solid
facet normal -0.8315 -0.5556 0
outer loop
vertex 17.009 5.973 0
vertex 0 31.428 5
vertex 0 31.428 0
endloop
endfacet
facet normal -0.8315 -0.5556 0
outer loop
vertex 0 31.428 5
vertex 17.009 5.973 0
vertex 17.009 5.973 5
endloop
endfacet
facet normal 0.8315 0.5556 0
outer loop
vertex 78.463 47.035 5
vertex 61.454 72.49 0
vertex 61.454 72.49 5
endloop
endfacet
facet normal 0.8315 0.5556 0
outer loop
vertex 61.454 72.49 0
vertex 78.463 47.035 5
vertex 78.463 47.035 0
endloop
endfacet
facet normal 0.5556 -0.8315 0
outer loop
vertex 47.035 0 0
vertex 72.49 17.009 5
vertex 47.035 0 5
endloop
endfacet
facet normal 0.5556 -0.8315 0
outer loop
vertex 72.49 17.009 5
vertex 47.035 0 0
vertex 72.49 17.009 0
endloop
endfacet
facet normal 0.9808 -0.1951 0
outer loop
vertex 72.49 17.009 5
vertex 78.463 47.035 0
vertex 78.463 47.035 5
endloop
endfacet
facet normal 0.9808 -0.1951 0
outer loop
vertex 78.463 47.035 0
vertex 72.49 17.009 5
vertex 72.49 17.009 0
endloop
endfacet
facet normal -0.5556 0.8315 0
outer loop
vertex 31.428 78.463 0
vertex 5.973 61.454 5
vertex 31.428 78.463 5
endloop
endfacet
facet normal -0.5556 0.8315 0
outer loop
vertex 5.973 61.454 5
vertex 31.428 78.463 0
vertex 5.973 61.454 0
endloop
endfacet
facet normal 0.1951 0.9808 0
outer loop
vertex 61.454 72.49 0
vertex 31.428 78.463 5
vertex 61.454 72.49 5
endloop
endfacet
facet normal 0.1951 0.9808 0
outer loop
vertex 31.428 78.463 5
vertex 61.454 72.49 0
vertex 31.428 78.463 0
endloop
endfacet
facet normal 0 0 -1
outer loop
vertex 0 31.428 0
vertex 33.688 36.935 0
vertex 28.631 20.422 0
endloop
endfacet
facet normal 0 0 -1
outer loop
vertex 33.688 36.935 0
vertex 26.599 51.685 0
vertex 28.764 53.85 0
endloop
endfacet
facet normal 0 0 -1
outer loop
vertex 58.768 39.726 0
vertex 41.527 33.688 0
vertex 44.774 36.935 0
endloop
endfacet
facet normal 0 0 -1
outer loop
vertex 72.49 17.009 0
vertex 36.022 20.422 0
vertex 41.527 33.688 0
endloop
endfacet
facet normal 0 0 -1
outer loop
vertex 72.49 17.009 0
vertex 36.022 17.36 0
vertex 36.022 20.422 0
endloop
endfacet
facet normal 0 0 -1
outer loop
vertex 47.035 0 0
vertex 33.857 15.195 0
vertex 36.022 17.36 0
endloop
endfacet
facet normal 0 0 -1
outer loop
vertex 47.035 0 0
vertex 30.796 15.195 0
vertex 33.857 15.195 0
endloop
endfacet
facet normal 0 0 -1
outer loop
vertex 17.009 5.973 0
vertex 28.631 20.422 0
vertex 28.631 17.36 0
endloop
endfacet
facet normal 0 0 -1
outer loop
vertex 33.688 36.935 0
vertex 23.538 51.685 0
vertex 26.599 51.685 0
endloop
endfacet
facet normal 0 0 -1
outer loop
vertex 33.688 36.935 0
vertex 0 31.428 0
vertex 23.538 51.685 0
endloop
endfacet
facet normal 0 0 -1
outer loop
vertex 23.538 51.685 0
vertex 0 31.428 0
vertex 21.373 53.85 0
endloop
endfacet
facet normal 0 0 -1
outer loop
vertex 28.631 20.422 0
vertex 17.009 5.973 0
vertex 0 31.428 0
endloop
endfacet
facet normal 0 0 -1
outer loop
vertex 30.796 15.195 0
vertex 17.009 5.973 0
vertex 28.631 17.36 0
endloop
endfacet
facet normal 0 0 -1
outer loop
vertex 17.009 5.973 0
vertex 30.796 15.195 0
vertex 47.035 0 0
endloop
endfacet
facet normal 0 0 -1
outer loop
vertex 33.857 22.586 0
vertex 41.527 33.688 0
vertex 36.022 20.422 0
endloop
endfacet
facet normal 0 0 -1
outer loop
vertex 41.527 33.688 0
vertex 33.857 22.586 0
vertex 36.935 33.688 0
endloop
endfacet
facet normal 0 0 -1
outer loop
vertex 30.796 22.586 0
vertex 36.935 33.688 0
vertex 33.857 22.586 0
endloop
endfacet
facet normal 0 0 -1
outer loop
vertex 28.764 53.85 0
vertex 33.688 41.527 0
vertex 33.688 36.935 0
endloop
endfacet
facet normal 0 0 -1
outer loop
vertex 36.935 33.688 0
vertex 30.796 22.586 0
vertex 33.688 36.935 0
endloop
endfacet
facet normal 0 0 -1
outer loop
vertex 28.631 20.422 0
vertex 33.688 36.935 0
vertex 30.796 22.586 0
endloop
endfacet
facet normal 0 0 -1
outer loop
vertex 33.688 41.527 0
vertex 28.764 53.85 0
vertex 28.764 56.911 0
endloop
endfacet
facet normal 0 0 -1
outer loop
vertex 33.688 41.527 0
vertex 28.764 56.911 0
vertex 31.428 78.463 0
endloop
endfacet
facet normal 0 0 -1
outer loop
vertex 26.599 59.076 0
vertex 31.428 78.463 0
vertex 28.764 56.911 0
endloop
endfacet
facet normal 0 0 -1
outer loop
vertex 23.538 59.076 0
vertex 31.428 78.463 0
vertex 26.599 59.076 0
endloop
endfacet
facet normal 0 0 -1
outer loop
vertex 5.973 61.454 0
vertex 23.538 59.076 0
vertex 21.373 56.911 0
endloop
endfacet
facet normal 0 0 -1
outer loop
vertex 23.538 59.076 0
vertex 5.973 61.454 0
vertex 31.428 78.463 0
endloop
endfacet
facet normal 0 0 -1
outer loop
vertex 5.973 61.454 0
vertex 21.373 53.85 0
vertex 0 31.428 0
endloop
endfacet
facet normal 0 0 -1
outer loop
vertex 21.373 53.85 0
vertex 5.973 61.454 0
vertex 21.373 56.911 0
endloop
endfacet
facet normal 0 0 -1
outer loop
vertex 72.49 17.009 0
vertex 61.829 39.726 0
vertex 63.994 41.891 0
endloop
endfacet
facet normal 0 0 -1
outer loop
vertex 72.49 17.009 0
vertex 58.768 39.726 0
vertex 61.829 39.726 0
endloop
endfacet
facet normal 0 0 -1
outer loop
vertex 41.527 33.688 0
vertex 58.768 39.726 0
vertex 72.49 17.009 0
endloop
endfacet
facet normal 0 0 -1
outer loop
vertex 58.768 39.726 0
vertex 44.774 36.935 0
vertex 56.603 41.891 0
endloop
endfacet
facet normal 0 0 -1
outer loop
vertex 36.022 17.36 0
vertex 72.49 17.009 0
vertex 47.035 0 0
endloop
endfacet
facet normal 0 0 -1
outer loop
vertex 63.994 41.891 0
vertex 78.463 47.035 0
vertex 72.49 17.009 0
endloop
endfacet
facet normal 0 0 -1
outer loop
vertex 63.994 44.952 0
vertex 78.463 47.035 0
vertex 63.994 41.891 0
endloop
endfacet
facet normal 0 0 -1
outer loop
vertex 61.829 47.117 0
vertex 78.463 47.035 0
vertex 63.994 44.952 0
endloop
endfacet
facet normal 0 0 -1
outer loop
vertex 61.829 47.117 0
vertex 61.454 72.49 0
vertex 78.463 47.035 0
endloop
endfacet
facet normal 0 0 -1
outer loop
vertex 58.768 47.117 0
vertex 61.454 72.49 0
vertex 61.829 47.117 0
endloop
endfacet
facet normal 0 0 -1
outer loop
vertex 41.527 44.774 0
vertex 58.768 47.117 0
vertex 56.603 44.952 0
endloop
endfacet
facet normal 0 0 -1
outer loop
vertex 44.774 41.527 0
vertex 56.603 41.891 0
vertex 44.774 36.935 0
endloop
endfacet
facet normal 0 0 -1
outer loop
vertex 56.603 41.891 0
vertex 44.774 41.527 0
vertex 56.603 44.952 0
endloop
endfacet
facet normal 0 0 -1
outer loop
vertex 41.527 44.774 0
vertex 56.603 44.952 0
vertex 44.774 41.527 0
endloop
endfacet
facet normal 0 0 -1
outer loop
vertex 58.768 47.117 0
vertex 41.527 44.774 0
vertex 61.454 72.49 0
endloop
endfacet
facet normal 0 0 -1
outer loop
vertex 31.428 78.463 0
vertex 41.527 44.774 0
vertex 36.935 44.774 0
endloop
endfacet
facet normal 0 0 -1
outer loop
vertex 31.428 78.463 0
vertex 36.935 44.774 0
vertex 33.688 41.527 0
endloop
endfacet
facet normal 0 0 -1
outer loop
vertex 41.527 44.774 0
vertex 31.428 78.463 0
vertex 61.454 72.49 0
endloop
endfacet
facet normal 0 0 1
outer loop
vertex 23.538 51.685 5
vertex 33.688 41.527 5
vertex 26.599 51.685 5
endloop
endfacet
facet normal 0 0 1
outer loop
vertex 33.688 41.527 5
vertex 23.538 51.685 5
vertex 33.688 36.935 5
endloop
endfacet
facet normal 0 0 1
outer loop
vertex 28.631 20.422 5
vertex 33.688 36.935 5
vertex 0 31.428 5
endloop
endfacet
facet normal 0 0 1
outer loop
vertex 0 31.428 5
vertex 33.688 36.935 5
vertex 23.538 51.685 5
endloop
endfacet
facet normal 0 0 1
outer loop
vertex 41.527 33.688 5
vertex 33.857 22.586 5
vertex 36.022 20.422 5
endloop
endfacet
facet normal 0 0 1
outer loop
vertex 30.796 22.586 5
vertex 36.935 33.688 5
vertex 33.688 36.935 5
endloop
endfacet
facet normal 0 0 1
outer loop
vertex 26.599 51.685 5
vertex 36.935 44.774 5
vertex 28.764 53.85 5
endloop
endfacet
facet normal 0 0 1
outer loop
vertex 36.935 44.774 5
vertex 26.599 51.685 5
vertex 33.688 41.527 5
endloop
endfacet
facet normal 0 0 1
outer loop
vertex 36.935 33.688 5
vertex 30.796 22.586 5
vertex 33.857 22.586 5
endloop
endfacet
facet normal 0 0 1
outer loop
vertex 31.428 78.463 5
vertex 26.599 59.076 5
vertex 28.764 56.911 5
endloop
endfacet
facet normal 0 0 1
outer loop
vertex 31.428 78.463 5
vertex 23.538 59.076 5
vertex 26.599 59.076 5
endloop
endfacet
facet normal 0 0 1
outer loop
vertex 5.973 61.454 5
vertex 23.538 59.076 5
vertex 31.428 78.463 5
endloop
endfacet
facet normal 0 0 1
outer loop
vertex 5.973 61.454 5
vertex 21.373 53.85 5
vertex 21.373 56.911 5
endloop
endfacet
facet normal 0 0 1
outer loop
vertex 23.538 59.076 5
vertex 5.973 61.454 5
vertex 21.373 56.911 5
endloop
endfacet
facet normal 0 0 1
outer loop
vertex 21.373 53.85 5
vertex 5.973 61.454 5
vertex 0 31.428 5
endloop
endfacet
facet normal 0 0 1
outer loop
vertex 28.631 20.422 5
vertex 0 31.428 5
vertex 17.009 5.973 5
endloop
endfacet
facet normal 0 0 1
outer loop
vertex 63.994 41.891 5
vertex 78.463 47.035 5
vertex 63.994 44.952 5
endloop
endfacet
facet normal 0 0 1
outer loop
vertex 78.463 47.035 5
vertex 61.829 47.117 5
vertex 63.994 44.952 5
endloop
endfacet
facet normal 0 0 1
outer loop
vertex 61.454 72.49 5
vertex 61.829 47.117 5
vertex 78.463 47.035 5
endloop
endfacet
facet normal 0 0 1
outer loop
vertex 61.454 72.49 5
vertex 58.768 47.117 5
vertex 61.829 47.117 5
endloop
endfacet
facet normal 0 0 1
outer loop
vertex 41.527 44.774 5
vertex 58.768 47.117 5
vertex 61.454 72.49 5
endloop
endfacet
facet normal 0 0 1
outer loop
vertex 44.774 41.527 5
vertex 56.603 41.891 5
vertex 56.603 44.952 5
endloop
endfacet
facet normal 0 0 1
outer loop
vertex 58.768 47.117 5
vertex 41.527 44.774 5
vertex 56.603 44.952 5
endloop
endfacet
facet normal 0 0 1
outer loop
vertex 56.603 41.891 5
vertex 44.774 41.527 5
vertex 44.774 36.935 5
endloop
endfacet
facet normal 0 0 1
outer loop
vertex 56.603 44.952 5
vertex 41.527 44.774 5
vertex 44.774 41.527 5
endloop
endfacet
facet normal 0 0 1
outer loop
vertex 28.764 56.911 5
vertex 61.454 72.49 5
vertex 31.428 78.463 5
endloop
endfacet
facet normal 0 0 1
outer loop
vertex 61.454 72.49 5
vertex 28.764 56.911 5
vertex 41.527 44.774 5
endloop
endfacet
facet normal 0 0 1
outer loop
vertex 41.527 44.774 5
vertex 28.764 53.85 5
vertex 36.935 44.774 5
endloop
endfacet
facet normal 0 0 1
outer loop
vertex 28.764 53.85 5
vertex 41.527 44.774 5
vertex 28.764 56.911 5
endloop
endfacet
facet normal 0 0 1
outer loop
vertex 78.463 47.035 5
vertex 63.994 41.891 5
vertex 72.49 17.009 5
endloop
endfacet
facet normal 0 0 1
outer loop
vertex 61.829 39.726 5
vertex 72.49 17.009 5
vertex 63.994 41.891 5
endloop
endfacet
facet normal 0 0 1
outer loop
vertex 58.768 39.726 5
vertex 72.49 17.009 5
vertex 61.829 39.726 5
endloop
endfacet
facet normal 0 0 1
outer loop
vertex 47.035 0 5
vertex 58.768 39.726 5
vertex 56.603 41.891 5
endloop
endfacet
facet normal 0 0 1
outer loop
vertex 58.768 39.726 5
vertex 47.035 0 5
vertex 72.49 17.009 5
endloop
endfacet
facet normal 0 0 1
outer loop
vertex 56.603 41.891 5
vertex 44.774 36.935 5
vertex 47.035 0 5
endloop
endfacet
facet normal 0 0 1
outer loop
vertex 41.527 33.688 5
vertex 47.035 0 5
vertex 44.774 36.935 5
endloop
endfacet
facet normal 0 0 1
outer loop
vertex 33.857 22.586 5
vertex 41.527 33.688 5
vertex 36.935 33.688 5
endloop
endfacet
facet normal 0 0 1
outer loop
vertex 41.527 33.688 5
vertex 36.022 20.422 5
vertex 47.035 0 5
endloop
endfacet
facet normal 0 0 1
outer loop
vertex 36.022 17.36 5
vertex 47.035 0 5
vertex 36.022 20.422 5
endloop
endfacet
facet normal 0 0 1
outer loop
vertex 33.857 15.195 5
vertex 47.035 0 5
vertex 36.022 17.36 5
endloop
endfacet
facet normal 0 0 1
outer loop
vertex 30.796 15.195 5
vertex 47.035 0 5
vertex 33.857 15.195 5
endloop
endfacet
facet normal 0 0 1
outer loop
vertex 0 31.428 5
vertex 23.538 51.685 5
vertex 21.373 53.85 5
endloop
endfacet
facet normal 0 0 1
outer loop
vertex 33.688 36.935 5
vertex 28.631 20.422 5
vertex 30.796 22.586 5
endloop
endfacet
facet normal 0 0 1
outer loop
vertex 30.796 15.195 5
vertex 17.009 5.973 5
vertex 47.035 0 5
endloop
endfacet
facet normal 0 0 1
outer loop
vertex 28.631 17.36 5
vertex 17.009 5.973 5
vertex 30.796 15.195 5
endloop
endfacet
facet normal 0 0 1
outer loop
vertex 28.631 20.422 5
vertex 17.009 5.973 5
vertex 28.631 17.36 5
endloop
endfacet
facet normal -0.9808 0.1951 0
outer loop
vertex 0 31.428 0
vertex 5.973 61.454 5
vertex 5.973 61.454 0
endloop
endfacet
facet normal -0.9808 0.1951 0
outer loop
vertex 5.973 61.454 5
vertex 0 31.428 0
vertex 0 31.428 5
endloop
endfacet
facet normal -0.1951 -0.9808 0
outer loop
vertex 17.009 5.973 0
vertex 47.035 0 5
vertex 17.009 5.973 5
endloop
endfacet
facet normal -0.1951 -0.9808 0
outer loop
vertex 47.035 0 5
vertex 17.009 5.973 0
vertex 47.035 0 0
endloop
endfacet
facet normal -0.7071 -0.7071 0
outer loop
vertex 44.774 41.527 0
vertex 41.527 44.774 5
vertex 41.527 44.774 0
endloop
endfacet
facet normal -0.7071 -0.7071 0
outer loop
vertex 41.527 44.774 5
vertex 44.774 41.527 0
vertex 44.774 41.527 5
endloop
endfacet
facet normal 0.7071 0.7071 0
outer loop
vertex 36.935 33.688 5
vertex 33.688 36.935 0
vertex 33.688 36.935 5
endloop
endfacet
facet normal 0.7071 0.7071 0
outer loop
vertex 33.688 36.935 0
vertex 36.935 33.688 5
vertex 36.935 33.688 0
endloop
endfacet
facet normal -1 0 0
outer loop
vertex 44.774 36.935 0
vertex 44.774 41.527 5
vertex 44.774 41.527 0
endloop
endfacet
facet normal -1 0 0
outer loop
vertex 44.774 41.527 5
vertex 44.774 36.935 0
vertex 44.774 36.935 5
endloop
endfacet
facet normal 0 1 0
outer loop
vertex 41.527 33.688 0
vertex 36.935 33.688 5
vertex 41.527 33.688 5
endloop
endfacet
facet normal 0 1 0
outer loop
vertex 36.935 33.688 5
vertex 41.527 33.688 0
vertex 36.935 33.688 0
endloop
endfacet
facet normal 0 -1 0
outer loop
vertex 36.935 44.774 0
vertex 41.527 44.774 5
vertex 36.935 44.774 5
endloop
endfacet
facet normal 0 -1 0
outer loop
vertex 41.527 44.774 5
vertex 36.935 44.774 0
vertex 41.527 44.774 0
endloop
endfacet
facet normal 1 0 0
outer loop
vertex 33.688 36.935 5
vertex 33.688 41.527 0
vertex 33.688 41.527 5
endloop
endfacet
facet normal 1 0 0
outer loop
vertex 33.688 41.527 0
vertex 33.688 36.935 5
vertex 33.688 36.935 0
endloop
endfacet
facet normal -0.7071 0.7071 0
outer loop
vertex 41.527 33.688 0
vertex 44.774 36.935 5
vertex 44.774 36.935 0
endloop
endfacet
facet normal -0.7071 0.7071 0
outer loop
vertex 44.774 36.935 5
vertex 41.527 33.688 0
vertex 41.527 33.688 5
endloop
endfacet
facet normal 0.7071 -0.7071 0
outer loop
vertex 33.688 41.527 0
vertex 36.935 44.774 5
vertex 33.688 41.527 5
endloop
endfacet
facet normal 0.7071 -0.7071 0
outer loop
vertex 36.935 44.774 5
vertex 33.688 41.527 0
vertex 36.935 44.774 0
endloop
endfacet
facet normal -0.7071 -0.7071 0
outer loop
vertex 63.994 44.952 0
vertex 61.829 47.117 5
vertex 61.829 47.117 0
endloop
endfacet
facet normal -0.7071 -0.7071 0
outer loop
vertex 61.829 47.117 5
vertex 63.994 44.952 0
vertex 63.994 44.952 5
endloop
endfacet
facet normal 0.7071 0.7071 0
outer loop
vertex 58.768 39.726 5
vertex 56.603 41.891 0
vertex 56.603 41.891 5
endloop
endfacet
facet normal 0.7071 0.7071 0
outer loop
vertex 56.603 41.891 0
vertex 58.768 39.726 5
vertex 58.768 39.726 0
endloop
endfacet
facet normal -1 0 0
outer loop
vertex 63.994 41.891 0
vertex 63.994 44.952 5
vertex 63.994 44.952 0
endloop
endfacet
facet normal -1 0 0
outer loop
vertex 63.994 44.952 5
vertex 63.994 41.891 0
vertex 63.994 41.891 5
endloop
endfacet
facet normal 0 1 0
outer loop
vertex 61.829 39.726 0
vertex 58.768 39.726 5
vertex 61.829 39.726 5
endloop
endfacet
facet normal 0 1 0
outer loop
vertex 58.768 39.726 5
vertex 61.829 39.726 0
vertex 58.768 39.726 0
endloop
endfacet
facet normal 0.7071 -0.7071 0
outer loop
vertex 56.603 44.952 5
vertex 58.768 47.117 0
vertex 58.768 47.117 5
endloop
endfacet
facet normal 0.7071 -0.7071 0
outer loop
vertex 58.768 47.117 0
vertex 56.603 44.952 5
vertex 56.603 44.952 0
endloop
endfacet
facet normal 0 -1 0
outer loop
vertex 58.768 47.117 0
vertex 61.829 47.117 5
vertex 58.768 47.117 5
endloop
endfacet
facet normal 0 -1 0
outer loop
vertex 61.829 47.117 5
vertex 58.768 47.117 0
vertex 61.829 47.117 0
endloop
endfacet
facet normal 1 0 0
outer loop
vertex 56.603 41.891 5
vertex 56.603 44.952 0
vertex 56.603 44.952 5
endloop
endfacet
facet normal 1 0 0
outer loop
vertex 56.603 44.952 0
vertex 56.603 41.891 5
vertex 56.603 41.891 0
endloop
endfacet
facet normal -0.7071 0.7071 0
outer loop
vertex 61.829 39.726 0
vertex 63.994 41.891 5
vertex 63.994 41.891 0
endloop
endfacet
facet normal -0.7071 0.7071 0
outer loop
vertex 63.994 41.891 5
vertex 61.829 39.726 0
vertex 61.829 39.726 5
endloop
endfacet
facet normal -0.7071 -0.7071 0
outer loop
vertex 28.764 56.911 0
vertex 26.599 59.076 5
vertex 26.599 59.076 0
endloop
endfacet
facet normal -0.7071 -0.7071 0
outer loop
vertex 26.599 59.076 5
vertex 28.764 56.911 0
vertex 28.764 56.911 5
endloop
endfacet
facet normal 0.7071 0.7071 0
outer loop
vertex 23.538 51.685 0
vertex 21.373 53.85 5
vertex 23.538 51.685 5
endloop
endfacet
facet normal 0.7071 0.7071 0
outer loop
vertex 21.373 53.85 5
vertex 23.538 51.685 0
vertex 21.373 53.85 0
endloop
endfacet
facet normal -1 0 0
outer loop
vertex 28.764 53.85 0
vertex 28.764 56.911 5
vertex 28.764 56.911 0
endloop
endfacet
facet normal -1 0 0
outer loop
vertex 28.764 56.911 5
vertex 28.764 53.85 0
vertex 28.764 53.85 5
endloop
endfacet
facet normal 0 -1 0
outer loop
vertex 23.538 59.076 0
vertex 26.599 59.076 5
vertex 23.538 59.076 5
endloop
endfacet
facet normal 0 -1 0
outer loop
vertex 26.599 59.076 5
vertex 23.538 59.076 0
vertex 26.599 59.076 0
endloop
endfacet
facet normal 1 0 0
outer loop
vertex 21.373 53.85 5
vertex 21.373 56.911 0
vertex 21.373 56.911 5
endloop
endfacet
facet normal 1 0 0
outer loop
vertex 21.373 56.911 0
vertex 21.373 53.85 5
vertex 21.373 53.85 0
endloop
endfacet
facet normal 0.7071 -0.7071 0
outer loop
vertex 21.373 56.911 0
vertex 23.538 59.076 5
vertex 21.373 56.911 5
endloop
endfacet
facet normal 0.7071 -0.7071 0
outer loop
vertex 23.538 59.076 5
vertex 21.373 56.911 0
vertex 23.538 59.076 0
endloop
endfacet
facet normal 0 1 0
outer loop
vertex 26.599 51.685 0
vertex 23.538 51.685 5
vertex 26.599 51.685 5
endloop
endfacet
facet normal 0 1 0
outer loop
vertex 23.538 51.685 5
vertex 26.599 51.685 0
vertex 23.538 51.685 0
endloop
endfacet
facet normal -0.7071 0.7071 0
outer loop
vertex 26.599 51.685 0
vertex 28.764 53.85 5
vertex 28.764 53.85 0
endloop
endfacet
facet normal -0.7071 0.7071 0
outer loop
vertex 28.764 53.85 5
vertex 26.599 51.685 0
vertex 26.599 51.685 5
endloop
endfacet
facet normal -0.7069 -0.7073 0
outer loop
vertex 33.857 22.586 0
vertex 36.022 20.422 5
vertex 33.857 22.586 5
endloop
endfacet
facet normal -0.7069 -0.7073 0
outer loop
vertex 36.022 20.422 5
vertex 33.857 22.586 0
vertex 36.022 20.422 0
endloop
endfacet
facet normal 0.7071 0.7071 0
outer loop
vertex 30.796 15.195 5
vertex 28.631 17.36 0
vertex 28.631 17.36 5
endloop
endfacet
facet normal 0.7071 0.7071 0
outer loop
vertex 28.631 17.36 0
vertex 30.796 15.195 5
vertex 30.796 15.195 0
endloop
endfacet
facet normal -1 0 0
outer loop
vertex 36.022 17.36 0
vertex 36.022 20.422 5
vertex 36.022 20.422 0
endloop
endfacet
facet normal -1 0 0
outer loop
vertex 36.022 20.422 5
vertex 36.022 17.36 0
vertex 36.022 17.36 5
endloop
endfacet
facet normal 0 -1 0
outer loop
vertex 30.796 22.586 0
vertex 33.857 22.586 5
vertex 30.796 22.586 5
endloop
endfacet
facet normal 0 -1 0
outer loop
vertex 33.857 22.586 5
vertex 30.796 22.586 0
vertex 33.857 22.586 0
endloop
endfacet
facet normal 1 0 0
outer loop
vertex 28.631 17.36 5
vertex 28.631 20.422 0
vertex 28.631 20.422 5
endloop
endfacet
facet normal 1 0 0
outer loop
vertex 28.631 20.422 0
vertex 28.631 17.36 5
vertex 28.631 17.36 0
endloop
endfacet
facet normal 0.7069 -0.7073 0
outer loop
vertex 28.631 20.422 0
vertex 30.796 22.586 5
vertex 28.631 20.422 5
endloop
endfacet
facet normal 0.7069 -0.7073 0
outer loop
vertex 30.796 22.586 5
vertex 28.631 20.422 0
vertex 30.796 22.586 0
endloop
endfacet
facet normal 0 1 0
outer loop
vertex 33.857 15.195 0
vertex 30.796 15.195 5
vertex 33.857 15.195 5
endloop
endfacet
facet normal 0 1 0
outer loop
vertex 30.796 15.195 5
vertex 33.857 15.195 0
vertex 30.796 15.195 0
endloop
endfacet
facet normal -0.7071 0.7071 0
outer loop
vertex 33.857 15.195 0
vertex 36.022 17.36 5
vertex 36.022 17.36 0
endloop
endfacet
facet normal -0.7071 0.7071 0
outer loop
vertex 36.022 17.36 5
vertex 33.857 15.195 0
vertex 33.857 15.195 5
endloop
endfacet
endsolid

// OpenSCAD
$fn = 32;

// ----------------------------------------------------------------------
// Polygon plate: 8-gon R40, 3 bolt windows
// ----------------------------------------------------------------------

// --- parameters (mm) ---
sides = 8;                // number of polygon sides
plate_r = 40;             // circumscribed radius of the polygon
bore_r = 6;               // centre bore radius
bolts = 3;                // number of bolt windows
ring_r = 21.48;           // bolt-circle radius
bolt_r = 4;               // bolt window radius
plate_t = 5;              // plate thickness, Z (extrusion height)

plate_d = 2 * plate_r;  // circumscribed diameter
bore_d = 2 * bore_r;  // centre bore diameter
bolt_d = 2 * bolt_r;  // bolt window diameter
ring_d = 2 * ring_r;  // bolt-circle diameter

profile = [[78.463, 47.035], [61.454, 72.49], [31.428, 78.463], [5.973, 61.454], [0, 31.428], [17.009, 5.973], [47.035, 0], [72.49, 17.009]];  // primary outline, 8 points, counter clockwise
void_1 = [[44.774, 41.527], [41.527, 44.774], [36.935, 44.774], [33.688, 41.527], [33.688, 36.935], [36.935, 33.688], [41.527, 33.688], [44.774, 36.935]];  // centre bore, 8 points
void_2 = [[63.994, 44.952], [61.829, 47.117], [58.768, 47.117], [56.603, 44.952], [56.603, 41.891], [58.768, 39.726], [61.829, 39.726], [63.994, 41.891]];  // bolt window 1, 8 points
void_3 = [[28.764, 56.911], [26.599, 59.076], [23.538, 59.076], [21.373, 56.911], [21.373, 53.85], [23.538, 51.685], [26.599, 51.685], [28.764, 53.85]];  // bolt window 2, 8 points
void_4 = [[36.022, 20.422], [33.857, 22.586], [30.796, 22.586], [28.631, 20.422], [28.631, 17.36], [30.796, 15.195], [33.857, 15.195], [36.022, 17.36]];  // bolt window 3, 8 points

// --- the one profile operation ---
difference() {
  linear_extrude(height = plate_t) polygon(points = profile);
  translate([0, 0, -1])
    linear_extrude(height = plate_t + 2) polygon(points = void_1);
  translate([0, 0, -1])
    linear_extrude(height = plate_t + 2) polygon(points = void_2);
  translate([0, 0, -1])
    linear_extrude(height = plate_t + 2) polygon(points = void_3);
  translate([0, 0, -1])
    linear_extrude(height = plate_t + 2) polygon(points = void_4);
}
